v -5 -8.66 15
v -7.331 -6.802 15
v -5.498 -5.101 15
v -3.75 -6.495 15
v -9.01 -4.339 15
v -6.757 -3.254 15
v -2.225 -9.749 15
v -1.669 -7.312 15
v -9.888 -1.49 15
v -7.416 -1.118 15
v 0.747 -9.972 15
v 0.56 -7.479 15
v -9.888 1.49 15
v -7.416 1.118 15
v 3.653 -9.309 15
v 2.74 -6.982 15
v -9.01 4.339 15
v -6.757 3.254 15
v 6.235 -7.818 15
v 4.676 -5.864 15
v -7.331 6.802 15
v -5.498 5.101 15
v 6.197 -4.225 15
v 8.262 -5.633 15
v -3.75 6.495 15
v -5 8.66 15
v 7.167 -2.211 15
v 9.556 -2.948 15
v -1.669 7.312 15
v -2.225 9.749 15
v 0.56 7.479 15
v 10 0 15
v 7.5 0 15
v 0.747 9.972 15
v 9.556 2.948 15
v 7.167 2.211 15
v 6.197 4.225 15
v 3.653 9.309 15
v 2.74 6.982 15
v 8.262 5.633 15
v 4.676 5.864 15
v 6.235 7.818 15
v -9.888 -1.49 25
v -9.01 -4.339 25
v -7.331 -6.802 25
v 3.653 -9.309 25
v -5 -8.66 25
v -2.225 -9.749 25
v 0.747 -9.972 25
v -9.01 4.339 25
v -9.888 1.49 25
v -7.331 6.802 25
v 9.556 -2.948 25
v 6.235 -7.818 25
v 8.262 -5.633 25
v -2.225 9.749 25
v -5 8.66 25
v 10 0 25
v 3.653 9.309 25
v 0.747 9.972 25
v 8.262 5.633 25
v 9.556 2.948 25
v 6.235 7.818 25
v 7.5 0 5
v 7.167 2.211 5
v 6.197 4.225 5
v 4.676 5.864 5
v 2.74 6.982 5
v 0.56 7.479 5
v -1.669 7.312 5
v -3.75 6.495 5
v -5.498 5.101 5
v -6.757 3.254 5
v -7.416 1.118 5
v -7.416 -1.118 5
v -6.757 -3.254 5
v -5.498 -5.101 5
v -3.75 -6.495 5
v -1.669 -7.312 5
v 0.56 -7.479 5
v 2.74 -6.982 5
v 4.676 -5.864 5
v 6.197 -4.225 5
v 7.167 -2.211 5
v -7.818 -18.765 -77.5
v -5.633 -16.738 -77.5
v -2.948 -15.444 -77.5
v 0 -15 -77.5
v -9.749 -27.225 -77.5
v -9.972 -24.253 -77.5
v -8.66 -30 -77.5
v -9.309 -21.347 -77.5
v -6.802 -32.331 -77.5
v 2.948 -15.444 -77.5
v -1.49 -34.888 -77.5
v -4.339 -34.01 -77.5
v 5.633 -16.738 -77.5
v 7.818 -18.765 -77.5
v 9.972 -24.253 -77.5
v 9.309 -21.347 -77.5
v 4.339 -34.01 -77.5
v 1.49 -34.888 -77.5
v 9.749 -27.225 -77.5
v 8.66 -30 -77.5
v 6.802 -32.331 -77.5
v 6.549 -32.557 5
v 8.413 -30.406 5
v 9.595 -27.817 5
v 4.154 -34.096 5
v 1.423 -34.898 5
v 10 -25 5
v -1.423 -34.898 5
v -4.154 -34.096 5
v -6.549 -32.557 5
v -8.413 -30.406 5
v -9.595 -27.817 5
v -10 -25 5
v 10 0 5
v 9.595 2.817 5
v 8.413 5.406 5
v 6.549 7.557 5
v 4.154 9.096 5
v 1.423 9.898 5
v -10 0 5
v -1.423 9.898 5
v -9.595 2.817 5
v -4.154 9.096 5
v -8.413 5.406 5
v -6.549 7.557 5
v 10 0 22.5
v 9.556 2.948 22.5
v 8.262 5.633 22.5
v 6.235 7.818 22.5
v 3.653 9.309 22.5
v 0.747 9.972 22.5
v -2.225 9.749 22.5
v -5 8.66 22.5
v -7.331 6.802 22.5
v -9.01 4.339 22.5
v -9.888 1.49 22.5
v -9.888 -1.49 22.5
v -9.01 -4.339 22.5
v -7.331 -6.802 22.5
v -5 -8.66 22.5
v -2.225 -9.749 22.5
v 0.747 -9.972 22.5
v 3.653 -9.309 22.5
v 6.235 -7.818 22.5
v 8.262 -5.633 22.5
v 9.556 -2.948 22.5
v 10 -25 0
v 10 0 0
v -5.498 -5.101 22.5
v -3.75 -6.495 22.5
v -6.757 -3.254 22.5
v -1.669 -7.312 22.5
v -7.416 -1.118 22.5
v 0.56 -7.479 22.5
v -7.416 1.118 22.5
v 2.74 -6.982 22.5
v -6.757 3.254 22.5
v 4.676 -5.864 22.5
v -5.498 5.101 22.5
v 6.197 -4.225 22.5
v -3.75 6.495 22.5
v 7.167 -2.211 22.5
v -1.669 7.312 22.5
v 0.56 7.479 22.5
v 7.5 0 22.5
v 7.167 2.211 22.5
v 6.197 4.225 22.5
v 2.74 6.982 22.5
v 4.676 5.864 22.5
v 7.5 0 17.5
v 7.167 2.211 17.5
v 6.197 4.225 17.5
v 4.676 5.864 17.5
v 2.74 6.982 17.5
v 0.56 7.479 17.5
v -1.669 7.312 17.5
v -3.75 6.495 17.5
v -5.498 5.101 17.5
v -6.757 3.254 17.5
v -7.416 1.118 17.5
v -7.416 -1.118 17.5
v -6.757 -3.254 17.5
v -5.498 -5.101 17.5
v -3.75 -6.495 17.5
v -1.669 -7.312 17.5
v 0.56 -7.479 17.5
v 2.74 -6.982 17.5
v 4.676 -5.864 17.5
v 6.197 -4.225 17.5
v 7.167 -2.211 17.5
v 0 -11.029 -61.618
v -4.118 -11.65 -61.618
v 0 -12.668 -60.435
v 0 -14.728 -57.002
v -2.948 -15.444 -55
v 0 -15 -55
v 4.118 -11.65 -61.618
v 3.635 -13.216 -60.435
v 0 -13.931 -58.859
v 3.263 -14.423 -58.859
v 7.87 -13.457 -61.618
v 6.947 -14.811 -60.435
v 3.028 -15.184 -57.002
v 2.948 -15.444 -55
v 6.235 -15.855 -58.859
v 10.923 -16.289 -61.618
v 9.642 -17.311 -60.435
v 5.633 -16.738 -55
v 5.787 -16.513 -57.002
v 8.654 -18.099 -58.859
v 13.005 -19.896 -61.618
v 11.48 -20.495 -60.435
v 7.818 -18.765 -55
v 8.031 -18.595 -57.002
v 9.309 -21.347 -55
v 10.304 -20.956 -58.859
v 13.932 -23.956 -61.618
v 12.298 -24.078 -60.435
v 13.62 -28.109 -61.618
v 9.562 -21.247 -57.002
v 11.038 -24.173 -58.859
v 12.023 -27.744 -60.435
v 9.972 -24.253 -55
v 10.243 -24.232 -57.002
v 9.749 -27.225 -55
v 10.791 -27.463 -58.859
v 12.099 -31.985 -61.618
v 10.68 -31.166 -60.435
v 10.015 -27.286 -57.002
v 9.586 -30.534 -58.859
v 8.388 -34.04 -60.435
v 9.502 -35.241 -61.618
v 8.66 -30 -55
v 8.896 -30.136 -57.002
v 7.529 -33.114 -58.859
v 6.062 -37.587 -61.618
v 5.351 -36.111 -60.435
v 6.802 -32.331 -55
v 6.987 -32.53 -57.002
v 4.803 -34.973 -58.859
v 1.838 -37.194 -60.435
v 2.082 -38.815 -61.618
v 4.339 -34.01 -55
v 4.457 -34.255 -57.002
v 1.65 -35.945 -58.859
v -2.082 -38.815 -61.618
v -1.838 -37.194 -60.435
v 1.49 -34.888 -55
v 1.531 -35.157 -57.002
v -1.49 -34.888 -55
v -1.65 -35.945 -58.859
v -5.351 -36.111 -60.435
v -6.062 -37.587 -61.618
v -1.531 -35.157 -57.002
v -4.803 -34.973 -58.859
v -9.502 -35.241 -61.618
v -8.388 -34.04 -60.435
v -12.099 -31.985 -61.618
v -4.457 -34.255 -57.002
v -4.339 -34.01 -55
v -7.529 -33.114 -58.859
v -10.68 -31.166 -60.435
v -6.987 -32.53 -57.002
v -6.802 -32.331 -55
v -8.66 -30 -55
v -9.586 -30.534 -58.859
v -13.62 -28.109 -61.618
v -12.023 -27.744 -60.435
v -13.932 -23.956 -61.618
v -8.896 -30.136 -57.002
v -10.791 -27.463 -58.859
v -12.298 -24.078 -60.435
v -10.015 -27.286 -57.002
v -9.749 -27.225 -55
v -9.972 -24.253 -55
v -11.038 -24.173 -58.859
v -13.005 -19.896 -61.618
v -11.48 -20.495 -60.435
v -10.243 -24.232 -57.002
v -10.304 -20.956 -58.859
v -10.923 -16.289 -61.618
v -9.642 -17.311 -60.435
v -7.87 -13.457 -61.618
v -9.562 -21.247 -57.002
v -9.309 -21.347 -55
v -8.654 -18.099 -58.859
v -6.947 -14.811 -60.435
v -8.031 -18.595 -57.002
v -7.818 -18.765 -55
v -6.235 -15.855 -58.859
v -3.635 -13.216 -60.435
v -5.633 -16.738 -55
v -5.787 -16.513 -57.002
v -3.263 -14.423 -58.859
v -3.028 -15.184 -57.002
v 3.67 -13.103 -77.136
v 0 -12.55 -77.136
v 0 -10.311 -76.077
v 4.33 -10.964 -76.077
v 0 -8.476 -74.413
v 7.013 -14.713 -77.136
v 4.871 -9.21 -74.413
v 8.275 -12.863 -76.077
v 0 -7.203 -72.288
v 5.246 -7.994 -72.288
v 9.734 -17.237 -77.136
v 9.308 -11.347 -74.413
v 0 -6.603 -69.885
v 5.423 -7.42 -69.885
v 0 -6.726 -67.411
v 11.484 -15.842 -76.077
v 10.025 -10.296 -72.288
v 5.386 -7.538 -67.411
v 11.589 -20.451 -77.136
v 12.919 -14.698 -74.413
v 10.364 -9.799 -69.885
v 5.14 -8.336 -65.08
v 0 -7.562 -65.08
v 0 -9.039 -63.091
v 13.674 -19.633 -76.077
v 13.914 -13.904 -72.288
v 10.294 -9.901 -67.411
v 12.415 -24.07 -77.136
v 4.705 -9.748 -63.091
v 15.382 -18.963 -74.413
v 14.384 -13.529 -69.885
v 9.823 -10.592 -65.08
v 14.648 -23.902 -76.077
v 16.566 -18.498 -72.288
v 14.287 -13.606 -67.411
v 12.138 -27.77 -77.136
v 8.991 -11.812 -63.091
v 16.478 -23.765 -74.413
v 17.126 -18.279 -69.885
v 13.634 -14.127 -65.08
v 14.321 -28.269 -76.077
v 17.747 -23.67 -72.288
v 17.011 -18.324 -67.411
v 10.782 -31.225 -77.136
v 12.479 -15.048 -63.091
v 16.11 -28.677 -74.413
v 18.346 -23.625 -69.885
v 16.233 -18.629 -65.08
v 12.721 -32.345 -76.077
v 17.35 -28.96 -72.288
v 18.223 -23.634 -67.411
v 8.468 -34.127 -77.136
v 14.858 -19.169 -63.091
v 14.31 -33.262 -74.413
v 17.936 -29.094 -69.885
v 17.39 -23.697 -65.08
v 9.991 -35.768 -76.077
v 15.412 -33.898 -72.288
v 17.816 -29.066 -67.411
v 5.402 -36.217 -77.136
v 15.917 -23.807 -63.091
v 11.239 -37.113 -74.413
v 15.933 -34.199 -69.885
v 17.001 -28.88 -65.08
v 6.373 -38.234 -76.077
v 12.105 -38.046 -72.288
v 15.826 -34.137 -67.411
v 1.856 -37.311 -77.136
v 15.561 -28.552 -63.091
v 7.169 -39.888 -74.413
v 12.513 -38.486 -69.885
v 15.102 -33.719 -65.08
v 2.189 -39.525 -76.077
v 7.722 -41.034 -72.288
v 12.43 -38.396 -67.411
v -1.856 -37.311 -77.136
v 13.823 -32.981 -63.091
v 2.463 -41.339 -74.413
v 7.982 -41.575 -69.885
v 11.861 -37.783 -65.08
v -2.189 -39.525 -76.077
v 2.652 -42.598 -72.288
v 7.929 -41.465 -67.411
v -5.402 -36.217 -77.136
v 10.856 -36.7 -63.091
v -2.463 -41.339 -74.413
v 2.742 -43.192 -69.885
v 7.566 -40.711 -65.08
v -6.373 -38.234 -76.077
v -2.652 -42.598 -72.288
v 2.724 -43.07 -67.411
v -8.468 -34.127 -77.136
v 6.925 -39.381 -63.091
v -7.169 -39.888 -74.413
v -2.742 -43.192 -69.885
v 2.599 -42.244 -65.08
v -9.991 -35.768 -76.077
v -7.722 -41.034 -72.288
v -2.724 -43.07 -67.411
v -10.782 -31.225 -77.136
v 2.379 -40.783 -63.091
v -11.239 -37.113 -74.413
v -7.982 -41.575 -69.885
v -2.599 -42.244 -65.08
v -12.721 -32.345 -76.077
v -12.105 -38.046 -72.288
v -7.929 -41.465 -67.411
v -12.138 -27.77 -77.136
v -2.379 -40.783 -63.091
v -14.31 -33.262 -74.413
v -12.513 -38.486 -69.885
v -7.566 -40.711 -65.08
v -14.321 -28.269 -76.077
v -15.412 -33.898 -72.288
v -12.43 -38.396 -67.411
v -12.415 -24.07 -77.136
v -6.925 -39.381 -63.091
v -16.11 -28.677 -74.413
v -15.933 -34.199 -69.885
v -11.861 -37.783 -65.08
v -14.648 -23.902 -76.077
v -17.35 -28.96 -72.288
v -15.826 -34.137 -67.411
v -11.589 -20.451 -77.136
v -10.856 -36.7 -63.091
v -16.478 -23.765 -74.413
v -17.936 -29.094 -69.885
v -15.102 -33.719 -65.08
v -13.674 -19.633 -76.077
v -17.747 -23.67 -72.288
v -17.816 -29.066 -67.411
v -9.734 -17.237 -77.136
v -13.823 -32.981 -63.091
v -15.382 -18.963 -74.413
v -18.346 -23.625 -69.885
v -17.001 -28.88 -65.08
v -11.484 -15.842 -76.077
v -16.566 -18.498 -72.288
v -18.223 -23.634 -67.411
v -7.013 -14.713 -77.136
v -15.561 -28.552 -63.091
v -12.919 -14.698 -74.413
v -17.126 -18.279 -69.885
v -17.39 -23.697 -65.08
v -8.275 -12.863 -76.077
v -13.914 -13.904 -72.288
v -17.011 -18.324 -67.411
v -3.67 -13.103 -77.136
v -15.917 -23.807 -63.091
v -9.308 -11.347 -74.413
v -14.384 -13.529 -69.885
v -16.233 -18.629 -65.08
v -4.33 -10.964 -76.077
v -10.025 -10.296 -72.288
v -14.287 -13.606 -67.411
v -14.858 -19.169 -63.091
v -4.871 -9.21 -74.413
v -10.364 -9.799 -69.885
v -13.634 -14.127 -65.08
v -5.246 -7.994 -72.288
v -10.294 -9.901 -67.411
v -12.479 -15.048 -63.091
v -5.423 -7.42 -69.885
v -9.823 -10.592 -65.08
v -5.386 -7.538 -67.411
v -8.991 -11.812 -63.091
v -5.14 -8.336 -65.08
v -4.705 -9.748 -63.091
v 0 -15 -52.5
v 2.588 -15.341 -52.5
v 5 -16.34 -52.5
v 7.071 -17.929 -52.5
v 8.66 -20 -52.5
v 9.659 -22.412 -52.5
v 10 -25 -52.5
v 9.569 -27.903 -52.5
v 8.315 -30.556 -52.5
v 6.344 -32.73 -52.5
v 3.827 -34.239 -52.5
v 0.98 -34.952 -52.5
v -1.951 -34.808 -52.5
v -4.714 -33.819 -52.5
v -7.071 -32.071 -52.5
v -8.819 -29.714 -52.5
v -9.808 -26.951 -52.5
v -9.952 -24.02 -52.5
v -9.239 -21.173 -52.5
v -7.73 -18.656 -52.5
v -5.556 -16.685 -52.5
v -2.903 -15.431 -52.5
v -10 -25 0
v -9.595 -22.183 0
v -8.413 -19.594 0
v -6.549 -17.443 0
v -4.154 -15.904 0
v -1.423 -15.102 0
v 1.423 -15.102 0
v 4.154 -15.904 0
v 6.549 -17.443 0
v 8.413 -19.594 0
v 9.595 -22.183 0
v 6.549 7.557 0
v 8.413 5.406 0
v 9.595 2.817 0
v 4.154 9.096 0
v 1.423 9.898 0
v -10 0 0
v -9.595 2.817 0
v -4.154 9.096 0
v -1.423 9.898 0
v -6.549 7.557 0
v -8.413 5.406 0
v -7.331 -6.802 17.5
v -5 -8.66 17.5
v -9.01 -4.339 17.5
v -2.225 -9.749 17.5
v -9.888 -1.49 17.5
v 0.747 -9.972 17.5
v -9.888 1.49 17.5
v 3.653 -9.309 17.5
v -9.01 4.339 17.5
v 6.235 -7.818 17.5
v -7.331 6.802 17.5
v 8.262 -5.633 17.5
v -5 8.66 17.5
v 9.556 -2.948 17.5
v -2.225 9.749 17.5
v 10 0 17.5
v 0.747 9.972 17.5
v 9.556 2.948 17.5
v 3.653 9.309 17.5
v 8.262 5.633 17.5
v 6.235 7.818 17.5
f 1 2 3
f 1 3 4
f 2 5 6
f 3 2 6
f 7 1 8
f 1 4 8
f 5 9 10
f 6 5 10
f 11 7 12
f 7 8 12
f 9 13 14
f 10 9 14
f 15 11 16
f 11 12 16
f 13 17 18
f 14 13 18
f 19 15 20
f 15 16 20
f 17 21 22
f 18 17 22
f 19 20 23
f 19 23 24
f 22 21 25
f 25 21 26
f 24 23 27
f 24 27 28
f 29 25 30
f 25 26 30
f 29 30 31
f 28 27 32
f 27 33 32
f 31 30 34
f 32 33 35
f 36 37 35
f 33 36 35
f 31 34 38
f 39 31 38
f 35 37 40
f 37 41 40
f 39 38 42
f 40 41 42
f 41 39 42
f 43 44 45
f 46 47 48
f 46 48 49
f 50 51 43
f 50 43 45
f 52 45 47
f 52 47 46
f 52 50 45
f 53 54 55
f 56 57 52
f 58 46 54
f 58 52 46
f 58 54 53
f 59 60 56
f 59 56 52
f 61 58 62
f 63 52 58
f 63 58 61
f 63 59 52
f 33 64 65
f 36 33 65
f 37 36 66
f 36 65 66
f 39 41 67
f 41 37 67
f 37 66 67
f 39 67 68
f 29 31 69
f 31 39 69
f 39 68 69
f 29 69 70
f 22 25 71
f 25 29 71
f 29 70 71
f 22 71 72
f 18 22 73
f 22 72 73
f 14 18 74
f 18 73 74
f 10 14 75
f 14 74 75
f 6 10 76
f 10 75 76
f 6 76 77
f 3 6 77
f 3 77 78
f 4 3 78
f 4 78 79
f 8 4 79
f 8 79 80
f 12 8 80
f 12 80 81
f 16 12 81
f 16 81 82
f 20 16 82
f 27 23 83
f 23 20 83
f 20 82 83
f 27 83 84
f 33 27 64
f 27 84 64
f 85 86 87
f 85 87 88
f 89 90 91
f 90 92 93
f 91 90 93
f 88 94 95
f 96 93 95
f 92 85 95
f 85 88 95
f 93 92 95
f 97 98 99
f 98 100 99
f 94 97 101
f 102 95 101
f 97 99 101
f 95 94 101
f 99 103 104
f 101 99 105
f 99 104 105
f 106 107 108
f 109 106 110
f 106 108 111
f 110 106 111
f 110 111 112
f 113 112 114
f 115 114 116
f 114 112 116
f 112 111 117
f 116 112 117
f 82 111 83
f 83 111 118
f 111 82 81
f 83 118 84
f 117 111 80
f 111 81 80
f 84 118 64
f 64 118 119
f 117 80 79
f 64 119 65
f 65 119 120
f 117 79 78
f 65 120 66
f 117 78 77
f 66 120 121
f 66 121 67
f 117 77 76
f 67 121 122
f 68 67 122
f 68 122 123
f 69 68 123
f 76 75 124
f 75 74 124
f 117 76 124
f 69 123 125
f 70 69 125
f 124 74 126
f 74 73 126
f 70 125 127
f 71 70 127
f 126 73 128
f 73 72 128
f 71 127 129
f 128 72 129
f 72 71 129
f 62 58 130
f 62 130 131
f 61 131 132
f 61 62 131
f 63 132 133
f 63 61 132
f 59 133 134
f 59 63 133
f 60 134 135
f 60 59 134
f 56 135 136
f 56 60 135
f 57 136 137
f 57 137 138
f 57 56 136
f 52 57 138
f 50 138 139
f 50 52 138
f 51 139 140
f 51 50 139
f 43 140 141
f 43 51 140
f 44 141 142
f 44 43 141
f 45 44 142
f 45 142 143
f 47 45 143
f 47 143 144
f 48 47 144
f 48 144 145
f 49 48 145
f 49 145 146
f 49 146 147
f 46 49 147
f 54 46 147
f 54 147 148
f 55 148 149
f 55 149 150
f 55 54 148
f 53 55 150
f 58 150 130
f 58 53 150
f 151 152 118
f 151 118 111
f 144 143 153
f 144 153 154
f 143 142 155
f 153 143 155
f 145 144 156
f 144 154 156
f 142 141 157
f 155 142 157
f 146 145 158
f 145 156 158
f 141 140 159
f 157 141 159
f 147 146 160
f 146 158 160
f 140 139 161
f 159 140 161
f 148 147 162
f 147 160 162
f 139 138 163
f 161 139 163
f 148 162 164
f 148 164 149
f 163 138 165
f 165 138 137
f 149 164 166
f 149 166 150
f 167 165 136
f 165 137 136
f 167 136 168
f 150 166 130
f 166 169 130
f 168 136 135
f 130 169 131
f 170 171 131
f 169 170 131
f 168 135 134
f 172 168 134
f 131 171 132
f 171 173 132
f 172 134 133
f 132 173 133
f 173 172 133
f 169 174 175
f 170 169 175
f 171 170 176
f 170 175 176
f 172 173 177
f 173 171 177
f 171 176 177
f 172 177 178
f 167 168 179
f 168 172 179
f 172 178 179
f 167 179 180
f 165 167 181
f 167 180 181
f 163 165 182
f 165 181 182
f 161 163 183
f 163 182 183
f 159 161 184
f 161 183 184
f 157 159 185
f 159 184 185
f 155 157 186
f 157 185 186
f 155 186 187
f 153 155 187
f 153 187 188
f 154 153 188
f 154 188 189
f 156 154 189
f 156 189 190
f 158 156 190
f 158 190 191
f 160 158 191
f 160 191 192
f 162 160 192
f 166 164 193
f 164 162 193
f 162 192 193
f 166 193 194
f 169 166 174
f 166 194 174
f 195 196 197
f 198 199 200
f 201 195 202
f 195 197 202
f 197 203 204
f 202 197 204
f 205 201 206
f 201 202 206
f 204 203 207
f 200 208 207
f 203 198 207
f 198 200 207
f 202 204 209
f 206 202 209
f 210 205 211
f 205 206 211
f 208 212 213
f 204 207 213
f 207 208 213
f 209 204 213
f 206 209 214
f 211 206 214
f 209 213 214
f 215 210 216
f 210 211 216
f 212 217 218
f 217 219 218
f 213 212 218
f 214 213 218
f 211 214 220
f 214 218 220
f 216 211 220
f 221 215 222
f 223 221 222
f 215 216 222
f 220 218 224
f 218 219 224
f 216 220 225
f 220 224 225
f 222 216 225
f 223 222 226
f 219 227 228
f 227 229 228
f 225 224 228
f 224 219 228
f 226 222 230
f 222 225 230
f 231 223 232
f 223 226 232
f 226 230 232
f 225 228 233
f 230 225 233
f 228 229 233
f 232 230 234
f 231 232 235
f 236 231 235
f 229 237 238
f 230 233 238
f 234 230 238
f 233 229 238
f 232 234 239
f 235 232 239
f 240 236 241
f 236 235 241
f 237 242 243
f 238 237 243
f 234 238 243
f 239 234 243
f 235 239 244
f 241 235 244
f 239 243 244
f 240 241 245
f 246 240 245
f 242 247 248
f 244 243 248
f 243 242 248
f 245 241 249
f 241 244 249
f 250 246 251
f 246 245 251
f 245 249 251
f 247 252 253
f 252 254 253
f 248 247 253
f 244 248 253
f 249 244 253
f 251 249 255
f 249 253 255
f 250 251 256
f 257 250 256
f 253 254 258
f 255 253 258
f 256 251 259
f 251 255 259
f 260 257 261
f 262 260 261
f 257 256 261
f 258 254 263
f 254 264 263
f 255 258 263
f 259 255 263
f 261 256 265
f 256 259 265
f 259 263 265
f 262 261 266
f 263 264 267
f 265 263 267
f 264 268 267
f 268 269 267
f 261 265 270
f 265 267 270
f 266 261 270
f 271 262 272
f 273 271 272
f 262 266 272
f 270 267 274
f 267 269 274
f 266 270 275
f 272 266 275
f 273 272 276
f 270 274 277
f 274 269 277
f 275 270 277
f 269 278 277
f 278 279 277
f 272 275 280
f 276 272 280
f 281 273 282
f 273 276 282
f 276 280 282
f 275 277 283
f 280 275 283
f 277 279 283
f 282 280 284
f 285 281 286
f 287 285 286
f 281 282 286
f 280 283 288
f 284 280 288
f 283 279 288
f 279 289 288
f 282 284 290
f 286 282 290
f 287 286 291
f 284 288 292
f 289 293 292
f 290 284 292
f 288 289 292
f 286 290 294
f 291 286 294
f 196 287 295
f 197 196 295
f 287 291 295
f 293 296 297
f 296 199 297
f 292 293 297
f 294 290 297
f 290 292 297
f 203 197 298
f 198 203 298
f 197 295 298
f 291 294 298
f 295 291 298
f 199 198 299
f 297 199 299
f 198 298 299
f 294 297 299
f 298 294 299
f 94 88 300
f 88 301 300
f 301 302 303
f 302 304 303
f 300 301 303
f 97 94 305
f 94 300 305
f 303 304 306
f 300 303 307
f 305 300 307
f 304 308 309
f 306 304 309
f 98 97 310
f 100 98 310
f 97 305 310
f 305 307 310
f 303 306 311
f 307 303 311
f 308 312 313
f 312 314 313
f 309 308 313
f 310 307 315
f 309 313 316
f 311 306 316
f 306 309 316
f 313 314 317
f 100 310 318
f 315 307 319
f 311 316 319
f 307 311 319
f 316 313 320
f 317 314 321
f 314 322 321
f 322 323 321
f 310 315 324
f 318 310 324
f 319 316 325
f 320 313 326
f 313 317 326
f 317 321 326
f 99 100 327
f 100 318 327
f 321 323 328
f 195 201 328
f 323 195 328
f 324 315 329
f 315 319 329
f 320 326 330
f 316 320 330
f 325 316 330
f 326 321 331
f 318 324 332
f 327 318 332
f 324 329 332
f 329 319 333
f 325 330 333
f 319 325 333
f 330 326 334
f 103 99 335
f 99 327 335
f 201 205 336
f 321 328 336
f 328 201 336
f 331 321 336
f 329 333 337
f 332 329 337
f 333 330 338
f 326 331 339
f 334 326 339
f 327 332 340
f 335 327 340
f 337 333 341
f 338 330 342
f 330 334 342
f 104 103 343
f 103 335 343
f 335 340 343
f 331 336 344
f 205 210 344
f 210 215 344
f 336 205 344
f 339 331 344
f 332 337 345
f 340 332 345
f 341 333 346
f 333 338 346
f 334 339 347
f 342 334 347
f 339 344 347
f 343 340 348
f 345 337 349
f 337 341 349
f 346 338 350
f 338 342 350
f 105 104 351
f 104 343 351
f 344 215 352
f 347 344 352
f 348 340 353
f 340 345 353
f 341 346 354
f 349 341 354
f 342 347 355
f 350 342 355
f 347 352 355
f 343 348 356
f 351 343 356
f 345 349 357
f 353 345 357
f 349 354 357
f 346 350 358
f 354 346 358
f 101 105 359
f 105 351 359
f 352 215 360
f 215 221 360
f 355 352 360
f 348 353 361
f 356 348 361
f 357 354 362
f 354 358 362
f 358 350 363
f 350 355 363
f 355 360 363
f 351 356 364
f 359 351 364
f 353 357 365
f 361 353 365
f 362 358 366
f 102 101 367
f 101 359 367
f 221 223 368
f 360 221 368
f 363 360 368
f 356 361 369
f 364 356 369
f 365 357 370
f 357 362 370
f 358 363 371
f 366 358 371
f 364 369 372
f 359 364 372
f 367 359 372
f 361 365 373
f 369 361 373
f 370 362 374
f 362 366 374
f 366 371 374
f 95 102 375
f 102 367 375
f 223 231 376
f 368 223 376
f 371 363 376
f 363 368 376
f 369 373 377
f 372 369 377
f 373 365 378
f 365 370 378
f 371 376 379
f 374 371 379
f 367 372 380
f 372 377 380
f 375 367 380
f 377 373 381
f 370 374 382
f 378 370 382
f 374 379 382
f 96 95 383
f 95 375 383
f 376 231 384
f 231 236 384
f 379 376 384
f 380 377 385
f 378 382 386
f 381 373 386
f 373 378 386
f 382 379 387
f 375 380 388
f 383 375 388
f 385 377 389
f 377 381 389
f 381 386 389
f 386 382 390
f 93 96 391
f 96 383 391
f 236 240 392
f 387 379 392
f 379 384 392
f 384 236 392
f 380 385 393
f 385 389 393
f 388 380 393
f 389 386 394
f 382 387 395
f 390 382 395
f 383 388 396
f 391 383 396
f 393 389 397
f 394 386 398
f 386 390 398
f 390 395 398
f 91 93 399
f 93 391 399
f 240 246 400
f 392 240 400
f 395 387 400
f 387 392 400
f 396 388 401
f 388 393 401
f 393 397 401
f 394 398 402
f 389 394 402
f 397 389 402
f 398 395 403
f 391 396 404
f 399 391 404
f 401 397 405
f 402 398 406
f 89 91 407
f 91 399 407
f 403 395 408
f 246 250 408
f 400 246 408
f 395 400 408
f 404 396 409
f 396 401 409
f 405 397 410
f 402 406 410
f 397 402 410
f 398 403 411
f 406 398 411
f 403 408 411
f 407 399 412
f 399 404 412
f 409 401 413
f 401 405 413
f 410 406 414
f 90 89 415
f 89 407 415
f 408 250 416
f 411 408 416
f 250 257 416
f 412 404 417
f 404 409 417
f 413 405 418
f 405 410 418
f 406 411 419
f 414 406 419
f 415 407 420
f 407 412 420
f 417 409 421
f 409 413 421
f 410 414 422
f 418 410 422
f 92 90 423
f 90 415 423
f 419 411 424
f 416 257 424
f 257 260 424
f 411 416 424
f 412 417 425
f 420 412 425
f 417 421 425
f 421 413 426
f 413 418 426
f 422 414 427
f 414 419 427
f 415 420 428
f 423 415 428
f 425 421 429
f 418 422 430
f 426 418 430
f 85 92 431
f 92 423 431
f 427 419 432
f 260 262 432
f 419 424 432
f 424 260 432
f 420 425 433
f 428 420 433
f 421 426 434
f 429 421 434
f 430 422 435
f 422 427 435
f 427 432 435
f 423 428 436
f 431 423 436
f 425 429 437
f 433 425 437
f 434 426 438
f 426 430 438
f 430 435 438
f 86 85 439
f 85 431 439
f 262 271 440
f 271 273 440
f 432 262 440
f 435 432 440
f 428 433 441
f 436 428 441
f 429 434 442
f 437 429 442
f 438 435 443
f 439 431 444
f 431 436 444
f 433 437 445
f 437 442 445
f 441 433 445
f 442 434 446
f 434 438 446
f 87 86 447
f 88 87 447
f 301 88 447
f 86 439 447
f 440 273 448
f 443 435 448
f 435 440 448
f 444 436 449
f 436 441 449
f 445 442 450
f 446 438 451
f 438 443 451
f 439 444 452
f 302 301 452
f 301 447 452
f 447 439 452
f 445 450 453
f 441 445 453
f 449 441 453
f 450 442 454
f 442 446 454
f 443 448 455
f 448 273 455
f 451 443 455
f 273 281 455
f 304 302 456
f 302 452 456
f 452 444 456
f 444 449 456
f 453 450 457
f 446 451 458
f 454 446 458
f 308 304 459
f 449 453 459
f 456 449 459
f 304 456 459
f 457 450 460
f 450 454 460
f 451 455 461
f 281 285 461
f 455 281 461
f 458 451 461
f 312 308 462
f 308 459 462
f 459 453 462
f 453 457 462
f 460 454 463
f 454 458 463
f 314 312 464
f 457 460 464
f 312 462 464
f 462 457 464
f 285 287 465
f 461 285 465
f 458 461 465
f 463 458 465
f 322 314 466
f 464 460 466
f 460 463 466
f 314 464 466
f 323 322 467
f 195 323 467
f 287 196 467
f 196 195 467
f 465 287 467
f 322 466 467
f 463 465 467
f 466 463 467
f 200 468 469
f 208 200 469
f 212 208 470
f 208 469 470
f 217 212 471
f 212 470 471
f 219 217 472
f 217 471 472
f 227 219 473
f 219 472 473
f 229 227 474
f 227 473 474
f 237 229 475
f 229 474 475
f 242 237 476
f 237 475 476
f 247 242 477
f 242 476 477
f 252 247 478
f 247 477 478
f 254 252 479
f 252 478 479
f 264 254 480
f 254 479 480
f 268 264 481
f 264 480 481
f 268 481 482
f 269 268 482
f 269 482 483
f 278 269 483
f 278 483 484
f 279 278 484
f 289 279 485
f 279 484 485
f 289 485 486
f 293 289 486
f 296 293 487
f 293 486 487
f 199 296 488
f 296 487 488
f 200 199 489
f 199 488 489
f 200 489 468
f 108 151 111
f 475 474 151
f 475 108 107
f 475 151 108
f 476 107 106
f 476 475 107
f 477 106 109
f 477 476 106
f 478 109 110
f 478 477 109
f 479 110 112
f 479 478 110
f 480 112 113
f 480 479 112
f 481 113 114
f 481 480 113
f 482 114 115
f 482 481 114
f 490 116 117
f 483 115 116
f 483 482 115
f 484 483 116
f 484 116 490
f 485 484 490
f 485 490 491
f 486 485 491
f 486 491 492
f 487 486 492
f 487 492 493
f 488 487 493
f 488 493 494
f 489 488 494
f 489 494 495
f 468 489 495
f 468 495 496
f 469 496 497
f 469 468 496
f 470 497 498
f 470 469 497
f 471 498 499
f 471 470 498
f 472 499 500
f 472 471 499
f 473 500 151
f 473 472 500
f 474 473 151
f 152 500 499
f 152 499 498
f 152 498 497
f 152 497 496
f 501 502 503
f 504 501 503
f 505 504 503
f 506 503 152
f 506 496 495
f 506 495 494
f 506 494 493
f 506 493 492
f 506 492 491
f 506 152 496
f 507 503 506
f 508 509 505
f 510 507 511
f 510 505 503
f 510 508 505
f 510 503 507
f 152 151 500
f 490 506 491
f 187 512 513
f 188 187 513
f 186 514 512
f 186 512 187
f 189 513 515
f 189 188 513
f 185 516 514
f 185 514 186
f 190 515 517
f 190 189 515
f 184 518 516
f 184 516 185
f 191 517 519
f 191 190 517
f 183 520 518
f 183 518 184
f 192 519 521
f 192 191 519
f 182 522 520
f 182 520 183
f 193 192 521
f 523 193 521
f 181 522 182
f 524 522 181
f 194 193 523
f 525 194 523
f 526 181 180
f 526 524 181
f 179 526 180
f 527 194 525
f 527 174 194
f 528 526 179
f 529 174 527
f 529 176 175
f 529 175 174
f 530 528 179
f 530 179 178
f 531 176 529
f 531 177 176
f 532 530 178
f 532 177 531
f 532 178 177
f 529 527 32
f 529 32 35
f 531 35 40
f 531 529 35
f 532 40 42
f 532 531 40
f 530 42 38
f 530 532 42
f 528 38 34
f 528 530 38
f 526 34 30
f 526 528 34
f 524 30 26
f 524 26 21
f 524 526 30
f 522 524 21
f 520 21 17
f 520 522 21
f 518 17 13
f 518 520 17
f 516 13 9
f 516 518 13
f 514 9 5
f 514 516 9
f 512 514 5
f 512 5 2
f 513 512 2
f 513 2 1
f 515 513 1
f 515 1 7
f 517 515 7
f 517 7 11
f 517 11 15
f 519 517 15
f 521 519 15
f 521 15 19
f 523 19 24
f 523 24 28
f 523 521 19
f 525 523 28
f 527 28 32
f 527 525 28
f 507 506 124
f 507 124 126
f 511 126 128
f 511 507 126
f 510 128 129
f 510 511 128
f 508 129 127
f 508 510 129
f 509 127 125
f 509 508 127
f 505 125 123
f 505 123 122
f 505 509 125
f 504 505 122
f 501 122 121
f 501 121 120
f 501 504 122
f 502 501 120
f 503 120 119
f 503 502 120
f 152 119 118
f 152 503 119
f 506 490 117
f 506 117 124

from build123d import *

# Parameters (mm, degrees)
SKETCH1_R           = 7.5
BOSS_EXTRUDE1_DEPTH = 25
SKETCH2_R           = 10
BOSS_EXTRUDE2_DEPTH = 2.5
BOSS_EXTRUDE3_START = -7.5
SKETCH2_2_R         = 10
BOSS_EXTRUDE3_DEPTH = 2.5
BOSS_EXTRUDE4_START = -5
BOSS_EXTRUDE4_DEPTH = 5
SKETCH5_R           = 10
BOSS_EXTRUDE5_DEPTH = 57.5


with BuildPart() as part:
    # Sketch1 → Boss-Extrude1 (new body)
    with BuildSketch(Plane.XY):
        Circle(SKETCH1_R)
    extrude(amount=BOSS_EXTRUDE1_DEPTH)

    # Sketch2 → Boss-Extrude2 (add)
    with BuildSketch(Plane.XY.offset(25)):
        Circle(SKETCH2_R)
    extrude(amount=-BOSS_EXTRUDE2_DEPTH)

    # Sketch2<2> → Boss-Extrude3 (add)
    with BuildSketch(Plane.XY.offset(25).offset(BOSS_EXTRUDE3_START)):
        Circle(SKETCH2_2_R)
    extrude(amount=-BOSS_EXTRUDE3_DEPTH)

    # Sketch4 → Boss-Extrude4 (add)
    with BuildSketch(Plane(origin=(0, 0, 0), x_dir=(-1, 0, 0), z_dir=(0, 0, -1)).offset(BOSS_EXTRUDE4_START)):
        with BuildLine():
            Line((-10, 0), (-10, -25))
            ThreePointArc((-10, -25), (0, -35), (10, -25))
            Line((10, -25), (10, 0))
            ThreePointArc((10, 0), (0, 10), (-10, 0))
        make_face()
    extrude(amount=BOSS_EXTRUDE4_DEPTH)

    # Sketch5 → Boss-Extrude5 (add)
    with BuildSketch(Plane.XY.offset(5)):
        with Locations((0, -25)):
            Circle(SKETCH5_R)
    extrude(amount=-BOSS_EXTRUDE5_DEPTH)

    # Sketch6 → Revolve1 (revolve)
    with BuildSketch(Plane(origin=(0, 0, 0), x_dir=(0, 0, -1), z_dir=(1, 0, 0))):
        with BuildLine():
            Line((52.5, -25), (77.5, -25))
            Line((77.5, -25), (77.5, -15))
            ThreePointArc((77.5, -15), (71.108894336, -6.814422655), (61.617647059, -11.029411765))
            ThreePointArc((61.617647059, -11.029411765), (58.858718166, -13.931196943), (55, -15))
            Line((55, -15), (52.5, -15))
            Line((52.5, -15), (52.5, -25))
        make_face()
    revolve(axis=Axis((0, -25, -52.5), (0, 0, -1)))


solid = part.part
